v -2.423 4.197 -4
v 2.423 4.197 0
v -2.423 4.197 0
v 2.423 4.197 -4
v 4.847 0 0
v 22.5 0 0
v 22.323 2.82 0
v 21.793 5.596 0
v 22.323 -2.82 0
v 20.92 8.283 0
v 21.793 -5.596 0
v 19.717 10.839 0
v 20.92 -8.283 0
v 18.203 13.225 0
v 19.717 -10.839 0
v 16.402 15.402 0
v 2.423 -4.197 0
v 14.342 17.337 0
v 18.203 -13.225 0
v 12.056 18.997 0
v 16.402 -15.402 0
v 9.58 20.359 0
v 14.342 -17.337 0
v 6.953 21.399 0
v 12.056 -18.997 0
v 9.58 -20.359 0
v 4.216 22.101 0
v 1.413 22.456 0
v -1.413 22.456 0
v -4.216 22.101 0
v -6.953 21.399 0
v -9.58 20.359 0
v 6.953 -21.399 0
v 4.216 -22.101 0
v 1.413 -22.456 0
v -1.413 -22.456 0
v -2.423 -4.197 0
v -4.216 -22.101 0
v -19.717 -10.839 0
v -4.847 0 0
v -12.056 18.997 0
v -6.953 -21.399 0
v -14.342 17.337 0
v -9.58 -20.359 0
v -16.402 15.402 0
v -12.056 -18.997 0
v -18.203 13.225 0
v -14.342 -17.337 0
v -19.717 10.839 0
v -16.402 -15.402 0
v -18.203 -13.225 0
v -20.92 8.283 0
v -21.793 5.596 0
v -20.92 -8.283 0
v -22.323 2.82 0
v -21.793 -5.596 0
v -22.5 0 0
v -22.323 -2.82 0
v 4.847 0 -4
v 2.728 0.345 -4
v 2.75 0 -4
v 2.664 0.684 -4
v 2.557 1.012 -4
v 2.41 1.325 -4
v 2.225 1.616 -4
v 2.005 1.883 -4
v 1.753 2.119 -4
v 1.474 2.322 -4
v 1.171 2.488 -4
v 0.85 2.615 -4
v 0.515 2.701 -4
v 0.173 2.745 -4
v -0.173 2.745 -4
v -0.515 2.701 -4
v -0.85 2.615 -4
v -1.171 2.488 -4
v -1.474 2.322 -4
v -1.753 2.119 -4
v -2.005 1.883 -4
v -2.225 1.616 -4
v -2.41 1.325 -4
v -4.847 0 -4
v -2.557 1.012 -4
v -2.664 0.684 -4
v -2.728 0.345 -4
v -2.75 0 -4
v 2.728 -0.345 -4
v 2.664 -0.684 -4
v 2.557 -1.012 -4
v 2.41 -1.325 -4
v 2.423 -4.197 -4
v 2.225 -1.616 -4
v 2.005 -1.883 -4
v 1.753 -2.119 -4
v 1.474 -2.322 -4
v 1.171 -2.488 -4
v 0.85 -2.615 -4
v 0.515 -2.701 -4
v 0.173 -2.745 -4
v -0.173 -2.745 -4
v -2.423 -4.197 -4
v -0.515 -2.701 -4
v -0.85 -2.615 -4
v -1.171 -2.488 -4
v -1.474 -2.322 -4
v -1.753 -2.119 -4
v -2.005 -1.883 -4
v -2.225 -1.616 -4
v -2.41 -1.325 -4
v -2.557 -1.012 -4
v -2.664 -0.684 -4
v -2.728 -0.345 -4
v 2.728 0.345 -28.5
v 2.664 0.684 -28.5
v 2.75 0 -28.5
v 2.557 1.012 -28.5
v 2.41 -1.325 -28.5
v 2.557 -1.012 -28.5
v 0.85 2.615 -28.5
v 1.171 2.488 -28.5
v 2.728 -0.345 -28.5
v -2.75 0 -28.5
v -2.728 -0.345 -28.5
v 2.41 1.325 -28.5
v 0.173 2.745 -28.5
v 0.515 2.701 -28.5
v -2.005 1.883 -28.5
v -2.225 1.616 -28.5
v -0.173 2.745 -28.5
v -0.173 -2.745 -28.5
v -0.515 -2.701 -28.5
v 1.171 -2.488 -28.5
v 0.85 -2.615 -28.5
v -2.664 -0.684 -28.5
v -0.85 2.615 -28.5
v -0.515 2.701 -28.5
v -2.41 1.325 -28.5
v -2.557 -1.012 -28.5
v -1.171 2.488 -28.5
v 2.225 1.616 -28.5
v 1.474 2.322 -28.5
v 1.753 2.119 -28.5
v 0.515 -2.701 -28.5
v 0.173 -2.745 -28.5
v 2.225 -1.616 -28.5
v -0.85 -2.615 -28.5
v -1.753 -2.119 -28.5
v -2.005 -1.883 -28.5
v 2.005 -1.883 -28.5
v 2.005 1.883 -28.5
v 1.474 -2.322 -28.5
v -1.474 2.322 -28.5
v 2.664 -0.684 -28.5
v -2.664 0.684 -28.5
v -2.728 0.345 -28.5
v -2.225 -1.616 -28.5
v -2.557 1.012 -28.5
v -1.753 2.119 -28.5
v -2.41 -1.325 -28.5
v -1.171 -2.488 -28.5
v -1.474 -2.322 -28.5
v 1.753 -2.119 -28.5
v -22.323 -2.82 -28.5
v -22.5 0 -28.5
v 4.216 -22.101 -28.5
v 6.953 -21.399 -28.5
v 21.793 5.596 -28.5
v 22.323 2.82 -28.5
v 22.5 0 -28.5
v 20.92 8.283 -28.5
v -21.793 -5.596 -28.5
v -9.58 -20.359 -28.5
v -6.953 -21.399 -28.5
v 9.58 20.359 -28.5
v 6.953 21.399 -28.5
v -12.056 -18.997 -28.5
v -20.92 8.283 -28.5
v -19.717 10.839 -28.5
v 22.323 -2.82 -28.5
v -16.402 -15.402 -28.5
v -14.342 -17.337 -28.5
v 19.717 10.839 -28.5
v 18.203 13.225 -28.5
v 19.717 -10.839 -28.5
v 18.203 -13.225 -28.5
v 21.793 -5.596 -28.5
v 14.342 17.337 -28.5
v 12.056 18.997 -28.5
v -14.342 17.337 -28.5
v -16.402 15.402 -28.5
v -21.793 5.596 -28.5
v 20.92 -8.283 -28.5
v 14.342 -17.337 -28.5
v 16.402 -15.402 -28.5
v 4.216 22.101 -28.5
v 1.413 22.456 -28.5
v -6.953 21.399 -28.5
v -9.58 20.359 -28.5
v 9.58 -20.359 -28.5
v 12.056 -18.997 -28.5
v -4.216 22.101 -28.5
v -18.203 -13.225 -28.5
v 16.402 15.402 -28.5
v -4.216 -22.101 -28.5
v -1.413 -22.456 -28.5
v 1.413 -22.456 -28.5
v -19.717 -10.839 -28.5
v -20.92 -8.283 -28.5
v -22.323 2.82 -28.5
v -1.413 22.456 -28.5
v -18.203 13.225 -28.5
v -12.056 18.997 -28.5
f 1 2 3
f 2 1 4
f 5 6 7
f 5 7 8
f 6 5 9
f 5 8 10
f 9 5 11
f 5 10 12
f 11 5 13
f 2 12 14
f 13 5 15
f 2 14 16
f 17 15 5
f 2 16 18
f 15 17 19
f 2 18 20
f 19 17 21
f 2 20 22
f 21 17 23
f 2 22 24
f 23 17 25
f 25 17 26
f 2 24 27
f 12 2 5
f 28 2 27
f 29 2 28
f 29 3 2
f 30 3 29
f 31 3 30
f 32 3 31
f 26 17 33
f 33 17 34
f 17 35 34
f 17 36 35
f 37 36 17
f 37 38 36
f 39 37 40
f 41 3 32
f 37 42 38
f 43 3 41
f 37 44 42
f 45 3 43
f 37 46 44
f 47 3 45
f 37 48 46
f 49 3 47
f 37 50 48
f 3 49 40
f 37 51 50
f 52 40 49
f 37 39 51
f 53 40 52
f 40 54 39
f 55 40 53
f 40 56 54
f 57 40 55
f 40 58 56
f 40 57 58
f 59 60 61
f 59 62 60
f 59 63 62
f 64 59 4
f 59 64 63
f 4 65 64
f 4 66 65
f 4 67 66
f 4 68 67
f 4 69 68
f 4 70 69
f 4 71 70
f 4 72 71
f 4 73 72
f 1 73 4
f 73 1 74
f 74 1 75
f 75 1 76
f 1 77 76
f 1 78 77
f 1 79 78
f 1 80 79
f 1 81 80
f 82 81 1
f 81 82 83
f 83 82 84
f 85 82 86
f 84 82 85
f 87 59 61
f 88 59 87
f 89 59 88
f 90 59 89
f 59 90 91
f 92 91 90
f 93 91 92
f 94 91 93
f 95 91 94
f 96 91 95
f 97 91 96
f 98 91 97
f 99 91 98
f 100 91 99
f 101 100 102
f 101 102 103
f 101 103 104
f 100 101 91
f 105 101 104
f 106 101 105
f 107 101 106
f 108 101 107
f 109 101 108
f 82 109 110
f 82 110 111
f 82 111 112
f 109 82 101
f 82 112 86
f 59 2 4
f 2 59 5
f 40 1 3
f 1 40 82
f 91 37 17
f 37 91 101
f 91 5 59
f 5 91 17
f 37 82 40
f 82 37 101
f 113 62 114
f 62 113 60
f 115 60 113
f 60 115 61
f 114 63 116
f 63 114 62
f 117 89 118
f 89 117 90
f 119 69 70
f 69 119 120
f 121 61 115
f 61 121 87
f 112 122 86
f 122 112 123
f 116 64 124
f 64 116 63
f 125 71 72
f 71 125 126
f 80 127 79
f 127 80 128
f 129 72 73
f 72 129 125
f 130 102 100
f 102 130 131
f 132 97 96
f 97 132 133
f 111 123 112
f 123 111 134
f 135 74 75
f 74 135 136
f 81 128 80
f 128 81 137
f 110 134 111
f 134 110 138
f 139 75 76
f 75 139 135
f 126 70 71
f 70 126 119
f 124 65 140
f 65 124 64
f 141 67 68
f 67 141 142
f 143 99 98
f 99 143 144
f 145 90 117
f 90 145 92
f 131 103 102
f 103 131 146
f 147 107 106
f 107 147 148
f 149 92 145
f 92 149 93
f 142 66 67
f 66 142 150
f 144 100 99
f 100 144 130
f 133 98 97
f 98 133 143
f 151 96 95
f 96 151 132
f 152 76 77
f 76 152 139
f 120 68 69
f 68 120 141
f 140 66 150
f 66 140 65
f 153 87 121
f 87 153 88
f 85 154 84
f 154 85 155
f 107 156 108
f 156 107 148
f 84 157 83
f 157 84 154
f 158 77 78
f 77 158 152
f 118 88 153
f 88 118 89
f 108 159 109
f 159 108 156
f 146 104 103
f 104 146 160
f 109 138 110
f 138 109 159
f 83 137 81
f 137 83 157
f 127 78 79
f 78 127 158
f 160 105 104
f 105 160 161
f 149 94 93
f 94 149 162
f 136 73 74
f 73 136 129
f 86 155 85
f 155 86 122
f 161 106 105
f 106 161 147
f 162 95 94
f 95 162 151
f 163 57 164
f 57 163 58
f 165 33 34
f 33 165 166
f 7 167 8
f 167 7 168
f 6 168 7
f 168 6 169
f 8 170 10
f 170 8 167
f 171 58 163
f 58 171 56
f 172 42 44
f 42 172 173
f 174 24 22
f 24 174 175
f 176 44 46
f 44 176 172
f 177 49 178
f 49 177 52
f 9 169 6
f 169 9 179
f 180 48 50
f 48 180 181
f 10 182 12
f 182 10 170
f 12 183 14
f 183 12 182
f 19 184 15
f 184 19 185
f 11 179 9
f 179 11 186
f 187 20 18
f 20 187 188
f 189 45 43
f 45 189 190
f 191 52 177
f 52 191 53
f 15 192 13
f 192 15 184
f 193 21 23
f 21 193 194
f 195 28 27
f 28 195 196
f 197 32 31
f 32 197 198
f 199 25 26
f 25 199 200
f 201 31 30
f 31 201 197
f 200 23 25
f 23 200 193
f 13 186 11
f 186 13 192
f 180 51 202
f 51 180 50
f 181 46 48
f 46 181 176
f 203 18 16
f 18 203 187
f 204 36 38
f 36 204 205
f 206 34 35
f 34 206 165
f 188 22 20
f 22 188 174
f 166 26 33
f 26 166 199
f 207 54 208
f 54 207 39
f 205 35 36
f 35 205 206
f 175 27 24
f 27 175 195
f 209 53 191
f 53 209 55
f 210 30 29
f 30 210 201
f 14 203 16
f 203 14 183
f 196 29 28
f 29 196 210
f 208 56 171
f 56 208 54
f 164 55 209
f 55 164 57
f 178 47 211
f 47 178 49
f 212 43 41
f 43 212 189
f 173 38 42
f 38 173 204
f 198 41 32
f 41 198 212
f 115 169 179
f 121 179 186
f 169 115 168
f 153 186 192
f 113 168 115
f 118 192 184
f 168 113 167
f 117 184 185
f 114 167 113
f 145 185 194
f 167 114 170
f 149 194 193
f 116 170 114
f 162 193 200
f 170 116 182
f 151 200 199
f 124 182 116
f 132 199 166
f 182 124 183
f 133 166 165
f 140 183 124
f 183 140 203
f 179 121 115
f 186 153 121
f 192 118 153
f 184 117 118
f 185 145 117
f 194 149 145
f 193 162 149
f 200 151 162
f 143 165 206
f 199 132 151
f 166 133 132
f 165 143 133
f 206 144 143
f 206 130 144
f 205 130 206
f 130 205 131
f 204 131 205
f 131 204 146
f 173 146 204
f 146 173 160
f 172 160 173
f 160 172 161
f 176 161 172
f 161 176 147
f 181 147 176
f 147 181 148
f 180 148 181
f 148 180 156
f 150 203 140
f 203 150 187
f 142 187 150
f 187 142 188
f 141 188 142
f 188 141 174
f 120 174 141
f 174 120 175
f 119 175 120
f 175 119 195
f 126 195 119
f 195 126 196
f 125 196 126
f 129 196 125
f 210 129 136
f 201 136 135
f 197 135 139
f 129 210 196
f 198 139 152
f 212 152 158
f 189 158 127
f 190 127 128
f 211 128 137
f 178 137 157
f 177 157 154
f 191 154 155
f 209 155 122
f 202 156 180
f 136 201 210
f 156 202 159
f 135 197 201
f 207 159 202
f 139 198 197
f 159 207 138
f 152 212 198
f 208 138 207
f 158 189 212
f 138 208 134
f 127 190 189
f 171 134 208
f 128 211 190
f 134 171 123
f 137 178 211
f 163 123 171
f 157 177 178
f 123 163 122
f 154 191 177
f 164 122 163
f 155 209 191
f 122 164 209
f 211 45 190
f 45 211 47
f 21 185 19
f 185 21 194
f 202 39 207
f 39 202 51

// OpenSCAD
$fn = 50;

difference() {
	union() {
		translate(v = [0, 0, -28.5]) {
			cylinder(h = 28.5, r = 22.5);
		}
	}
	union() {
		translate(v = [0, 0, 0]) {
			rotate(a = [0, 0, 0]) {
				difference() {
					union() {
						translate(v = [0, 0, -4]) {
							linear_extrude(height = 4) {
								polygon(points = [[4.8468, 0.0], [2.4234000000000004, 4.197451927062417], [-2.423399999999999, 4.197451927062417], [-4.8468, 5.935618106107392e-16], [-2.423400000000002, -4.197451927062416], [2.423399999999997, -4.197451927062419]]);
							}
						}
					}
					union();
				}
			}
		}
		#translate(v = [0, 0, -100.0]) {
			cylinder(h = 200, r = 2.75);
		}
	}
}
